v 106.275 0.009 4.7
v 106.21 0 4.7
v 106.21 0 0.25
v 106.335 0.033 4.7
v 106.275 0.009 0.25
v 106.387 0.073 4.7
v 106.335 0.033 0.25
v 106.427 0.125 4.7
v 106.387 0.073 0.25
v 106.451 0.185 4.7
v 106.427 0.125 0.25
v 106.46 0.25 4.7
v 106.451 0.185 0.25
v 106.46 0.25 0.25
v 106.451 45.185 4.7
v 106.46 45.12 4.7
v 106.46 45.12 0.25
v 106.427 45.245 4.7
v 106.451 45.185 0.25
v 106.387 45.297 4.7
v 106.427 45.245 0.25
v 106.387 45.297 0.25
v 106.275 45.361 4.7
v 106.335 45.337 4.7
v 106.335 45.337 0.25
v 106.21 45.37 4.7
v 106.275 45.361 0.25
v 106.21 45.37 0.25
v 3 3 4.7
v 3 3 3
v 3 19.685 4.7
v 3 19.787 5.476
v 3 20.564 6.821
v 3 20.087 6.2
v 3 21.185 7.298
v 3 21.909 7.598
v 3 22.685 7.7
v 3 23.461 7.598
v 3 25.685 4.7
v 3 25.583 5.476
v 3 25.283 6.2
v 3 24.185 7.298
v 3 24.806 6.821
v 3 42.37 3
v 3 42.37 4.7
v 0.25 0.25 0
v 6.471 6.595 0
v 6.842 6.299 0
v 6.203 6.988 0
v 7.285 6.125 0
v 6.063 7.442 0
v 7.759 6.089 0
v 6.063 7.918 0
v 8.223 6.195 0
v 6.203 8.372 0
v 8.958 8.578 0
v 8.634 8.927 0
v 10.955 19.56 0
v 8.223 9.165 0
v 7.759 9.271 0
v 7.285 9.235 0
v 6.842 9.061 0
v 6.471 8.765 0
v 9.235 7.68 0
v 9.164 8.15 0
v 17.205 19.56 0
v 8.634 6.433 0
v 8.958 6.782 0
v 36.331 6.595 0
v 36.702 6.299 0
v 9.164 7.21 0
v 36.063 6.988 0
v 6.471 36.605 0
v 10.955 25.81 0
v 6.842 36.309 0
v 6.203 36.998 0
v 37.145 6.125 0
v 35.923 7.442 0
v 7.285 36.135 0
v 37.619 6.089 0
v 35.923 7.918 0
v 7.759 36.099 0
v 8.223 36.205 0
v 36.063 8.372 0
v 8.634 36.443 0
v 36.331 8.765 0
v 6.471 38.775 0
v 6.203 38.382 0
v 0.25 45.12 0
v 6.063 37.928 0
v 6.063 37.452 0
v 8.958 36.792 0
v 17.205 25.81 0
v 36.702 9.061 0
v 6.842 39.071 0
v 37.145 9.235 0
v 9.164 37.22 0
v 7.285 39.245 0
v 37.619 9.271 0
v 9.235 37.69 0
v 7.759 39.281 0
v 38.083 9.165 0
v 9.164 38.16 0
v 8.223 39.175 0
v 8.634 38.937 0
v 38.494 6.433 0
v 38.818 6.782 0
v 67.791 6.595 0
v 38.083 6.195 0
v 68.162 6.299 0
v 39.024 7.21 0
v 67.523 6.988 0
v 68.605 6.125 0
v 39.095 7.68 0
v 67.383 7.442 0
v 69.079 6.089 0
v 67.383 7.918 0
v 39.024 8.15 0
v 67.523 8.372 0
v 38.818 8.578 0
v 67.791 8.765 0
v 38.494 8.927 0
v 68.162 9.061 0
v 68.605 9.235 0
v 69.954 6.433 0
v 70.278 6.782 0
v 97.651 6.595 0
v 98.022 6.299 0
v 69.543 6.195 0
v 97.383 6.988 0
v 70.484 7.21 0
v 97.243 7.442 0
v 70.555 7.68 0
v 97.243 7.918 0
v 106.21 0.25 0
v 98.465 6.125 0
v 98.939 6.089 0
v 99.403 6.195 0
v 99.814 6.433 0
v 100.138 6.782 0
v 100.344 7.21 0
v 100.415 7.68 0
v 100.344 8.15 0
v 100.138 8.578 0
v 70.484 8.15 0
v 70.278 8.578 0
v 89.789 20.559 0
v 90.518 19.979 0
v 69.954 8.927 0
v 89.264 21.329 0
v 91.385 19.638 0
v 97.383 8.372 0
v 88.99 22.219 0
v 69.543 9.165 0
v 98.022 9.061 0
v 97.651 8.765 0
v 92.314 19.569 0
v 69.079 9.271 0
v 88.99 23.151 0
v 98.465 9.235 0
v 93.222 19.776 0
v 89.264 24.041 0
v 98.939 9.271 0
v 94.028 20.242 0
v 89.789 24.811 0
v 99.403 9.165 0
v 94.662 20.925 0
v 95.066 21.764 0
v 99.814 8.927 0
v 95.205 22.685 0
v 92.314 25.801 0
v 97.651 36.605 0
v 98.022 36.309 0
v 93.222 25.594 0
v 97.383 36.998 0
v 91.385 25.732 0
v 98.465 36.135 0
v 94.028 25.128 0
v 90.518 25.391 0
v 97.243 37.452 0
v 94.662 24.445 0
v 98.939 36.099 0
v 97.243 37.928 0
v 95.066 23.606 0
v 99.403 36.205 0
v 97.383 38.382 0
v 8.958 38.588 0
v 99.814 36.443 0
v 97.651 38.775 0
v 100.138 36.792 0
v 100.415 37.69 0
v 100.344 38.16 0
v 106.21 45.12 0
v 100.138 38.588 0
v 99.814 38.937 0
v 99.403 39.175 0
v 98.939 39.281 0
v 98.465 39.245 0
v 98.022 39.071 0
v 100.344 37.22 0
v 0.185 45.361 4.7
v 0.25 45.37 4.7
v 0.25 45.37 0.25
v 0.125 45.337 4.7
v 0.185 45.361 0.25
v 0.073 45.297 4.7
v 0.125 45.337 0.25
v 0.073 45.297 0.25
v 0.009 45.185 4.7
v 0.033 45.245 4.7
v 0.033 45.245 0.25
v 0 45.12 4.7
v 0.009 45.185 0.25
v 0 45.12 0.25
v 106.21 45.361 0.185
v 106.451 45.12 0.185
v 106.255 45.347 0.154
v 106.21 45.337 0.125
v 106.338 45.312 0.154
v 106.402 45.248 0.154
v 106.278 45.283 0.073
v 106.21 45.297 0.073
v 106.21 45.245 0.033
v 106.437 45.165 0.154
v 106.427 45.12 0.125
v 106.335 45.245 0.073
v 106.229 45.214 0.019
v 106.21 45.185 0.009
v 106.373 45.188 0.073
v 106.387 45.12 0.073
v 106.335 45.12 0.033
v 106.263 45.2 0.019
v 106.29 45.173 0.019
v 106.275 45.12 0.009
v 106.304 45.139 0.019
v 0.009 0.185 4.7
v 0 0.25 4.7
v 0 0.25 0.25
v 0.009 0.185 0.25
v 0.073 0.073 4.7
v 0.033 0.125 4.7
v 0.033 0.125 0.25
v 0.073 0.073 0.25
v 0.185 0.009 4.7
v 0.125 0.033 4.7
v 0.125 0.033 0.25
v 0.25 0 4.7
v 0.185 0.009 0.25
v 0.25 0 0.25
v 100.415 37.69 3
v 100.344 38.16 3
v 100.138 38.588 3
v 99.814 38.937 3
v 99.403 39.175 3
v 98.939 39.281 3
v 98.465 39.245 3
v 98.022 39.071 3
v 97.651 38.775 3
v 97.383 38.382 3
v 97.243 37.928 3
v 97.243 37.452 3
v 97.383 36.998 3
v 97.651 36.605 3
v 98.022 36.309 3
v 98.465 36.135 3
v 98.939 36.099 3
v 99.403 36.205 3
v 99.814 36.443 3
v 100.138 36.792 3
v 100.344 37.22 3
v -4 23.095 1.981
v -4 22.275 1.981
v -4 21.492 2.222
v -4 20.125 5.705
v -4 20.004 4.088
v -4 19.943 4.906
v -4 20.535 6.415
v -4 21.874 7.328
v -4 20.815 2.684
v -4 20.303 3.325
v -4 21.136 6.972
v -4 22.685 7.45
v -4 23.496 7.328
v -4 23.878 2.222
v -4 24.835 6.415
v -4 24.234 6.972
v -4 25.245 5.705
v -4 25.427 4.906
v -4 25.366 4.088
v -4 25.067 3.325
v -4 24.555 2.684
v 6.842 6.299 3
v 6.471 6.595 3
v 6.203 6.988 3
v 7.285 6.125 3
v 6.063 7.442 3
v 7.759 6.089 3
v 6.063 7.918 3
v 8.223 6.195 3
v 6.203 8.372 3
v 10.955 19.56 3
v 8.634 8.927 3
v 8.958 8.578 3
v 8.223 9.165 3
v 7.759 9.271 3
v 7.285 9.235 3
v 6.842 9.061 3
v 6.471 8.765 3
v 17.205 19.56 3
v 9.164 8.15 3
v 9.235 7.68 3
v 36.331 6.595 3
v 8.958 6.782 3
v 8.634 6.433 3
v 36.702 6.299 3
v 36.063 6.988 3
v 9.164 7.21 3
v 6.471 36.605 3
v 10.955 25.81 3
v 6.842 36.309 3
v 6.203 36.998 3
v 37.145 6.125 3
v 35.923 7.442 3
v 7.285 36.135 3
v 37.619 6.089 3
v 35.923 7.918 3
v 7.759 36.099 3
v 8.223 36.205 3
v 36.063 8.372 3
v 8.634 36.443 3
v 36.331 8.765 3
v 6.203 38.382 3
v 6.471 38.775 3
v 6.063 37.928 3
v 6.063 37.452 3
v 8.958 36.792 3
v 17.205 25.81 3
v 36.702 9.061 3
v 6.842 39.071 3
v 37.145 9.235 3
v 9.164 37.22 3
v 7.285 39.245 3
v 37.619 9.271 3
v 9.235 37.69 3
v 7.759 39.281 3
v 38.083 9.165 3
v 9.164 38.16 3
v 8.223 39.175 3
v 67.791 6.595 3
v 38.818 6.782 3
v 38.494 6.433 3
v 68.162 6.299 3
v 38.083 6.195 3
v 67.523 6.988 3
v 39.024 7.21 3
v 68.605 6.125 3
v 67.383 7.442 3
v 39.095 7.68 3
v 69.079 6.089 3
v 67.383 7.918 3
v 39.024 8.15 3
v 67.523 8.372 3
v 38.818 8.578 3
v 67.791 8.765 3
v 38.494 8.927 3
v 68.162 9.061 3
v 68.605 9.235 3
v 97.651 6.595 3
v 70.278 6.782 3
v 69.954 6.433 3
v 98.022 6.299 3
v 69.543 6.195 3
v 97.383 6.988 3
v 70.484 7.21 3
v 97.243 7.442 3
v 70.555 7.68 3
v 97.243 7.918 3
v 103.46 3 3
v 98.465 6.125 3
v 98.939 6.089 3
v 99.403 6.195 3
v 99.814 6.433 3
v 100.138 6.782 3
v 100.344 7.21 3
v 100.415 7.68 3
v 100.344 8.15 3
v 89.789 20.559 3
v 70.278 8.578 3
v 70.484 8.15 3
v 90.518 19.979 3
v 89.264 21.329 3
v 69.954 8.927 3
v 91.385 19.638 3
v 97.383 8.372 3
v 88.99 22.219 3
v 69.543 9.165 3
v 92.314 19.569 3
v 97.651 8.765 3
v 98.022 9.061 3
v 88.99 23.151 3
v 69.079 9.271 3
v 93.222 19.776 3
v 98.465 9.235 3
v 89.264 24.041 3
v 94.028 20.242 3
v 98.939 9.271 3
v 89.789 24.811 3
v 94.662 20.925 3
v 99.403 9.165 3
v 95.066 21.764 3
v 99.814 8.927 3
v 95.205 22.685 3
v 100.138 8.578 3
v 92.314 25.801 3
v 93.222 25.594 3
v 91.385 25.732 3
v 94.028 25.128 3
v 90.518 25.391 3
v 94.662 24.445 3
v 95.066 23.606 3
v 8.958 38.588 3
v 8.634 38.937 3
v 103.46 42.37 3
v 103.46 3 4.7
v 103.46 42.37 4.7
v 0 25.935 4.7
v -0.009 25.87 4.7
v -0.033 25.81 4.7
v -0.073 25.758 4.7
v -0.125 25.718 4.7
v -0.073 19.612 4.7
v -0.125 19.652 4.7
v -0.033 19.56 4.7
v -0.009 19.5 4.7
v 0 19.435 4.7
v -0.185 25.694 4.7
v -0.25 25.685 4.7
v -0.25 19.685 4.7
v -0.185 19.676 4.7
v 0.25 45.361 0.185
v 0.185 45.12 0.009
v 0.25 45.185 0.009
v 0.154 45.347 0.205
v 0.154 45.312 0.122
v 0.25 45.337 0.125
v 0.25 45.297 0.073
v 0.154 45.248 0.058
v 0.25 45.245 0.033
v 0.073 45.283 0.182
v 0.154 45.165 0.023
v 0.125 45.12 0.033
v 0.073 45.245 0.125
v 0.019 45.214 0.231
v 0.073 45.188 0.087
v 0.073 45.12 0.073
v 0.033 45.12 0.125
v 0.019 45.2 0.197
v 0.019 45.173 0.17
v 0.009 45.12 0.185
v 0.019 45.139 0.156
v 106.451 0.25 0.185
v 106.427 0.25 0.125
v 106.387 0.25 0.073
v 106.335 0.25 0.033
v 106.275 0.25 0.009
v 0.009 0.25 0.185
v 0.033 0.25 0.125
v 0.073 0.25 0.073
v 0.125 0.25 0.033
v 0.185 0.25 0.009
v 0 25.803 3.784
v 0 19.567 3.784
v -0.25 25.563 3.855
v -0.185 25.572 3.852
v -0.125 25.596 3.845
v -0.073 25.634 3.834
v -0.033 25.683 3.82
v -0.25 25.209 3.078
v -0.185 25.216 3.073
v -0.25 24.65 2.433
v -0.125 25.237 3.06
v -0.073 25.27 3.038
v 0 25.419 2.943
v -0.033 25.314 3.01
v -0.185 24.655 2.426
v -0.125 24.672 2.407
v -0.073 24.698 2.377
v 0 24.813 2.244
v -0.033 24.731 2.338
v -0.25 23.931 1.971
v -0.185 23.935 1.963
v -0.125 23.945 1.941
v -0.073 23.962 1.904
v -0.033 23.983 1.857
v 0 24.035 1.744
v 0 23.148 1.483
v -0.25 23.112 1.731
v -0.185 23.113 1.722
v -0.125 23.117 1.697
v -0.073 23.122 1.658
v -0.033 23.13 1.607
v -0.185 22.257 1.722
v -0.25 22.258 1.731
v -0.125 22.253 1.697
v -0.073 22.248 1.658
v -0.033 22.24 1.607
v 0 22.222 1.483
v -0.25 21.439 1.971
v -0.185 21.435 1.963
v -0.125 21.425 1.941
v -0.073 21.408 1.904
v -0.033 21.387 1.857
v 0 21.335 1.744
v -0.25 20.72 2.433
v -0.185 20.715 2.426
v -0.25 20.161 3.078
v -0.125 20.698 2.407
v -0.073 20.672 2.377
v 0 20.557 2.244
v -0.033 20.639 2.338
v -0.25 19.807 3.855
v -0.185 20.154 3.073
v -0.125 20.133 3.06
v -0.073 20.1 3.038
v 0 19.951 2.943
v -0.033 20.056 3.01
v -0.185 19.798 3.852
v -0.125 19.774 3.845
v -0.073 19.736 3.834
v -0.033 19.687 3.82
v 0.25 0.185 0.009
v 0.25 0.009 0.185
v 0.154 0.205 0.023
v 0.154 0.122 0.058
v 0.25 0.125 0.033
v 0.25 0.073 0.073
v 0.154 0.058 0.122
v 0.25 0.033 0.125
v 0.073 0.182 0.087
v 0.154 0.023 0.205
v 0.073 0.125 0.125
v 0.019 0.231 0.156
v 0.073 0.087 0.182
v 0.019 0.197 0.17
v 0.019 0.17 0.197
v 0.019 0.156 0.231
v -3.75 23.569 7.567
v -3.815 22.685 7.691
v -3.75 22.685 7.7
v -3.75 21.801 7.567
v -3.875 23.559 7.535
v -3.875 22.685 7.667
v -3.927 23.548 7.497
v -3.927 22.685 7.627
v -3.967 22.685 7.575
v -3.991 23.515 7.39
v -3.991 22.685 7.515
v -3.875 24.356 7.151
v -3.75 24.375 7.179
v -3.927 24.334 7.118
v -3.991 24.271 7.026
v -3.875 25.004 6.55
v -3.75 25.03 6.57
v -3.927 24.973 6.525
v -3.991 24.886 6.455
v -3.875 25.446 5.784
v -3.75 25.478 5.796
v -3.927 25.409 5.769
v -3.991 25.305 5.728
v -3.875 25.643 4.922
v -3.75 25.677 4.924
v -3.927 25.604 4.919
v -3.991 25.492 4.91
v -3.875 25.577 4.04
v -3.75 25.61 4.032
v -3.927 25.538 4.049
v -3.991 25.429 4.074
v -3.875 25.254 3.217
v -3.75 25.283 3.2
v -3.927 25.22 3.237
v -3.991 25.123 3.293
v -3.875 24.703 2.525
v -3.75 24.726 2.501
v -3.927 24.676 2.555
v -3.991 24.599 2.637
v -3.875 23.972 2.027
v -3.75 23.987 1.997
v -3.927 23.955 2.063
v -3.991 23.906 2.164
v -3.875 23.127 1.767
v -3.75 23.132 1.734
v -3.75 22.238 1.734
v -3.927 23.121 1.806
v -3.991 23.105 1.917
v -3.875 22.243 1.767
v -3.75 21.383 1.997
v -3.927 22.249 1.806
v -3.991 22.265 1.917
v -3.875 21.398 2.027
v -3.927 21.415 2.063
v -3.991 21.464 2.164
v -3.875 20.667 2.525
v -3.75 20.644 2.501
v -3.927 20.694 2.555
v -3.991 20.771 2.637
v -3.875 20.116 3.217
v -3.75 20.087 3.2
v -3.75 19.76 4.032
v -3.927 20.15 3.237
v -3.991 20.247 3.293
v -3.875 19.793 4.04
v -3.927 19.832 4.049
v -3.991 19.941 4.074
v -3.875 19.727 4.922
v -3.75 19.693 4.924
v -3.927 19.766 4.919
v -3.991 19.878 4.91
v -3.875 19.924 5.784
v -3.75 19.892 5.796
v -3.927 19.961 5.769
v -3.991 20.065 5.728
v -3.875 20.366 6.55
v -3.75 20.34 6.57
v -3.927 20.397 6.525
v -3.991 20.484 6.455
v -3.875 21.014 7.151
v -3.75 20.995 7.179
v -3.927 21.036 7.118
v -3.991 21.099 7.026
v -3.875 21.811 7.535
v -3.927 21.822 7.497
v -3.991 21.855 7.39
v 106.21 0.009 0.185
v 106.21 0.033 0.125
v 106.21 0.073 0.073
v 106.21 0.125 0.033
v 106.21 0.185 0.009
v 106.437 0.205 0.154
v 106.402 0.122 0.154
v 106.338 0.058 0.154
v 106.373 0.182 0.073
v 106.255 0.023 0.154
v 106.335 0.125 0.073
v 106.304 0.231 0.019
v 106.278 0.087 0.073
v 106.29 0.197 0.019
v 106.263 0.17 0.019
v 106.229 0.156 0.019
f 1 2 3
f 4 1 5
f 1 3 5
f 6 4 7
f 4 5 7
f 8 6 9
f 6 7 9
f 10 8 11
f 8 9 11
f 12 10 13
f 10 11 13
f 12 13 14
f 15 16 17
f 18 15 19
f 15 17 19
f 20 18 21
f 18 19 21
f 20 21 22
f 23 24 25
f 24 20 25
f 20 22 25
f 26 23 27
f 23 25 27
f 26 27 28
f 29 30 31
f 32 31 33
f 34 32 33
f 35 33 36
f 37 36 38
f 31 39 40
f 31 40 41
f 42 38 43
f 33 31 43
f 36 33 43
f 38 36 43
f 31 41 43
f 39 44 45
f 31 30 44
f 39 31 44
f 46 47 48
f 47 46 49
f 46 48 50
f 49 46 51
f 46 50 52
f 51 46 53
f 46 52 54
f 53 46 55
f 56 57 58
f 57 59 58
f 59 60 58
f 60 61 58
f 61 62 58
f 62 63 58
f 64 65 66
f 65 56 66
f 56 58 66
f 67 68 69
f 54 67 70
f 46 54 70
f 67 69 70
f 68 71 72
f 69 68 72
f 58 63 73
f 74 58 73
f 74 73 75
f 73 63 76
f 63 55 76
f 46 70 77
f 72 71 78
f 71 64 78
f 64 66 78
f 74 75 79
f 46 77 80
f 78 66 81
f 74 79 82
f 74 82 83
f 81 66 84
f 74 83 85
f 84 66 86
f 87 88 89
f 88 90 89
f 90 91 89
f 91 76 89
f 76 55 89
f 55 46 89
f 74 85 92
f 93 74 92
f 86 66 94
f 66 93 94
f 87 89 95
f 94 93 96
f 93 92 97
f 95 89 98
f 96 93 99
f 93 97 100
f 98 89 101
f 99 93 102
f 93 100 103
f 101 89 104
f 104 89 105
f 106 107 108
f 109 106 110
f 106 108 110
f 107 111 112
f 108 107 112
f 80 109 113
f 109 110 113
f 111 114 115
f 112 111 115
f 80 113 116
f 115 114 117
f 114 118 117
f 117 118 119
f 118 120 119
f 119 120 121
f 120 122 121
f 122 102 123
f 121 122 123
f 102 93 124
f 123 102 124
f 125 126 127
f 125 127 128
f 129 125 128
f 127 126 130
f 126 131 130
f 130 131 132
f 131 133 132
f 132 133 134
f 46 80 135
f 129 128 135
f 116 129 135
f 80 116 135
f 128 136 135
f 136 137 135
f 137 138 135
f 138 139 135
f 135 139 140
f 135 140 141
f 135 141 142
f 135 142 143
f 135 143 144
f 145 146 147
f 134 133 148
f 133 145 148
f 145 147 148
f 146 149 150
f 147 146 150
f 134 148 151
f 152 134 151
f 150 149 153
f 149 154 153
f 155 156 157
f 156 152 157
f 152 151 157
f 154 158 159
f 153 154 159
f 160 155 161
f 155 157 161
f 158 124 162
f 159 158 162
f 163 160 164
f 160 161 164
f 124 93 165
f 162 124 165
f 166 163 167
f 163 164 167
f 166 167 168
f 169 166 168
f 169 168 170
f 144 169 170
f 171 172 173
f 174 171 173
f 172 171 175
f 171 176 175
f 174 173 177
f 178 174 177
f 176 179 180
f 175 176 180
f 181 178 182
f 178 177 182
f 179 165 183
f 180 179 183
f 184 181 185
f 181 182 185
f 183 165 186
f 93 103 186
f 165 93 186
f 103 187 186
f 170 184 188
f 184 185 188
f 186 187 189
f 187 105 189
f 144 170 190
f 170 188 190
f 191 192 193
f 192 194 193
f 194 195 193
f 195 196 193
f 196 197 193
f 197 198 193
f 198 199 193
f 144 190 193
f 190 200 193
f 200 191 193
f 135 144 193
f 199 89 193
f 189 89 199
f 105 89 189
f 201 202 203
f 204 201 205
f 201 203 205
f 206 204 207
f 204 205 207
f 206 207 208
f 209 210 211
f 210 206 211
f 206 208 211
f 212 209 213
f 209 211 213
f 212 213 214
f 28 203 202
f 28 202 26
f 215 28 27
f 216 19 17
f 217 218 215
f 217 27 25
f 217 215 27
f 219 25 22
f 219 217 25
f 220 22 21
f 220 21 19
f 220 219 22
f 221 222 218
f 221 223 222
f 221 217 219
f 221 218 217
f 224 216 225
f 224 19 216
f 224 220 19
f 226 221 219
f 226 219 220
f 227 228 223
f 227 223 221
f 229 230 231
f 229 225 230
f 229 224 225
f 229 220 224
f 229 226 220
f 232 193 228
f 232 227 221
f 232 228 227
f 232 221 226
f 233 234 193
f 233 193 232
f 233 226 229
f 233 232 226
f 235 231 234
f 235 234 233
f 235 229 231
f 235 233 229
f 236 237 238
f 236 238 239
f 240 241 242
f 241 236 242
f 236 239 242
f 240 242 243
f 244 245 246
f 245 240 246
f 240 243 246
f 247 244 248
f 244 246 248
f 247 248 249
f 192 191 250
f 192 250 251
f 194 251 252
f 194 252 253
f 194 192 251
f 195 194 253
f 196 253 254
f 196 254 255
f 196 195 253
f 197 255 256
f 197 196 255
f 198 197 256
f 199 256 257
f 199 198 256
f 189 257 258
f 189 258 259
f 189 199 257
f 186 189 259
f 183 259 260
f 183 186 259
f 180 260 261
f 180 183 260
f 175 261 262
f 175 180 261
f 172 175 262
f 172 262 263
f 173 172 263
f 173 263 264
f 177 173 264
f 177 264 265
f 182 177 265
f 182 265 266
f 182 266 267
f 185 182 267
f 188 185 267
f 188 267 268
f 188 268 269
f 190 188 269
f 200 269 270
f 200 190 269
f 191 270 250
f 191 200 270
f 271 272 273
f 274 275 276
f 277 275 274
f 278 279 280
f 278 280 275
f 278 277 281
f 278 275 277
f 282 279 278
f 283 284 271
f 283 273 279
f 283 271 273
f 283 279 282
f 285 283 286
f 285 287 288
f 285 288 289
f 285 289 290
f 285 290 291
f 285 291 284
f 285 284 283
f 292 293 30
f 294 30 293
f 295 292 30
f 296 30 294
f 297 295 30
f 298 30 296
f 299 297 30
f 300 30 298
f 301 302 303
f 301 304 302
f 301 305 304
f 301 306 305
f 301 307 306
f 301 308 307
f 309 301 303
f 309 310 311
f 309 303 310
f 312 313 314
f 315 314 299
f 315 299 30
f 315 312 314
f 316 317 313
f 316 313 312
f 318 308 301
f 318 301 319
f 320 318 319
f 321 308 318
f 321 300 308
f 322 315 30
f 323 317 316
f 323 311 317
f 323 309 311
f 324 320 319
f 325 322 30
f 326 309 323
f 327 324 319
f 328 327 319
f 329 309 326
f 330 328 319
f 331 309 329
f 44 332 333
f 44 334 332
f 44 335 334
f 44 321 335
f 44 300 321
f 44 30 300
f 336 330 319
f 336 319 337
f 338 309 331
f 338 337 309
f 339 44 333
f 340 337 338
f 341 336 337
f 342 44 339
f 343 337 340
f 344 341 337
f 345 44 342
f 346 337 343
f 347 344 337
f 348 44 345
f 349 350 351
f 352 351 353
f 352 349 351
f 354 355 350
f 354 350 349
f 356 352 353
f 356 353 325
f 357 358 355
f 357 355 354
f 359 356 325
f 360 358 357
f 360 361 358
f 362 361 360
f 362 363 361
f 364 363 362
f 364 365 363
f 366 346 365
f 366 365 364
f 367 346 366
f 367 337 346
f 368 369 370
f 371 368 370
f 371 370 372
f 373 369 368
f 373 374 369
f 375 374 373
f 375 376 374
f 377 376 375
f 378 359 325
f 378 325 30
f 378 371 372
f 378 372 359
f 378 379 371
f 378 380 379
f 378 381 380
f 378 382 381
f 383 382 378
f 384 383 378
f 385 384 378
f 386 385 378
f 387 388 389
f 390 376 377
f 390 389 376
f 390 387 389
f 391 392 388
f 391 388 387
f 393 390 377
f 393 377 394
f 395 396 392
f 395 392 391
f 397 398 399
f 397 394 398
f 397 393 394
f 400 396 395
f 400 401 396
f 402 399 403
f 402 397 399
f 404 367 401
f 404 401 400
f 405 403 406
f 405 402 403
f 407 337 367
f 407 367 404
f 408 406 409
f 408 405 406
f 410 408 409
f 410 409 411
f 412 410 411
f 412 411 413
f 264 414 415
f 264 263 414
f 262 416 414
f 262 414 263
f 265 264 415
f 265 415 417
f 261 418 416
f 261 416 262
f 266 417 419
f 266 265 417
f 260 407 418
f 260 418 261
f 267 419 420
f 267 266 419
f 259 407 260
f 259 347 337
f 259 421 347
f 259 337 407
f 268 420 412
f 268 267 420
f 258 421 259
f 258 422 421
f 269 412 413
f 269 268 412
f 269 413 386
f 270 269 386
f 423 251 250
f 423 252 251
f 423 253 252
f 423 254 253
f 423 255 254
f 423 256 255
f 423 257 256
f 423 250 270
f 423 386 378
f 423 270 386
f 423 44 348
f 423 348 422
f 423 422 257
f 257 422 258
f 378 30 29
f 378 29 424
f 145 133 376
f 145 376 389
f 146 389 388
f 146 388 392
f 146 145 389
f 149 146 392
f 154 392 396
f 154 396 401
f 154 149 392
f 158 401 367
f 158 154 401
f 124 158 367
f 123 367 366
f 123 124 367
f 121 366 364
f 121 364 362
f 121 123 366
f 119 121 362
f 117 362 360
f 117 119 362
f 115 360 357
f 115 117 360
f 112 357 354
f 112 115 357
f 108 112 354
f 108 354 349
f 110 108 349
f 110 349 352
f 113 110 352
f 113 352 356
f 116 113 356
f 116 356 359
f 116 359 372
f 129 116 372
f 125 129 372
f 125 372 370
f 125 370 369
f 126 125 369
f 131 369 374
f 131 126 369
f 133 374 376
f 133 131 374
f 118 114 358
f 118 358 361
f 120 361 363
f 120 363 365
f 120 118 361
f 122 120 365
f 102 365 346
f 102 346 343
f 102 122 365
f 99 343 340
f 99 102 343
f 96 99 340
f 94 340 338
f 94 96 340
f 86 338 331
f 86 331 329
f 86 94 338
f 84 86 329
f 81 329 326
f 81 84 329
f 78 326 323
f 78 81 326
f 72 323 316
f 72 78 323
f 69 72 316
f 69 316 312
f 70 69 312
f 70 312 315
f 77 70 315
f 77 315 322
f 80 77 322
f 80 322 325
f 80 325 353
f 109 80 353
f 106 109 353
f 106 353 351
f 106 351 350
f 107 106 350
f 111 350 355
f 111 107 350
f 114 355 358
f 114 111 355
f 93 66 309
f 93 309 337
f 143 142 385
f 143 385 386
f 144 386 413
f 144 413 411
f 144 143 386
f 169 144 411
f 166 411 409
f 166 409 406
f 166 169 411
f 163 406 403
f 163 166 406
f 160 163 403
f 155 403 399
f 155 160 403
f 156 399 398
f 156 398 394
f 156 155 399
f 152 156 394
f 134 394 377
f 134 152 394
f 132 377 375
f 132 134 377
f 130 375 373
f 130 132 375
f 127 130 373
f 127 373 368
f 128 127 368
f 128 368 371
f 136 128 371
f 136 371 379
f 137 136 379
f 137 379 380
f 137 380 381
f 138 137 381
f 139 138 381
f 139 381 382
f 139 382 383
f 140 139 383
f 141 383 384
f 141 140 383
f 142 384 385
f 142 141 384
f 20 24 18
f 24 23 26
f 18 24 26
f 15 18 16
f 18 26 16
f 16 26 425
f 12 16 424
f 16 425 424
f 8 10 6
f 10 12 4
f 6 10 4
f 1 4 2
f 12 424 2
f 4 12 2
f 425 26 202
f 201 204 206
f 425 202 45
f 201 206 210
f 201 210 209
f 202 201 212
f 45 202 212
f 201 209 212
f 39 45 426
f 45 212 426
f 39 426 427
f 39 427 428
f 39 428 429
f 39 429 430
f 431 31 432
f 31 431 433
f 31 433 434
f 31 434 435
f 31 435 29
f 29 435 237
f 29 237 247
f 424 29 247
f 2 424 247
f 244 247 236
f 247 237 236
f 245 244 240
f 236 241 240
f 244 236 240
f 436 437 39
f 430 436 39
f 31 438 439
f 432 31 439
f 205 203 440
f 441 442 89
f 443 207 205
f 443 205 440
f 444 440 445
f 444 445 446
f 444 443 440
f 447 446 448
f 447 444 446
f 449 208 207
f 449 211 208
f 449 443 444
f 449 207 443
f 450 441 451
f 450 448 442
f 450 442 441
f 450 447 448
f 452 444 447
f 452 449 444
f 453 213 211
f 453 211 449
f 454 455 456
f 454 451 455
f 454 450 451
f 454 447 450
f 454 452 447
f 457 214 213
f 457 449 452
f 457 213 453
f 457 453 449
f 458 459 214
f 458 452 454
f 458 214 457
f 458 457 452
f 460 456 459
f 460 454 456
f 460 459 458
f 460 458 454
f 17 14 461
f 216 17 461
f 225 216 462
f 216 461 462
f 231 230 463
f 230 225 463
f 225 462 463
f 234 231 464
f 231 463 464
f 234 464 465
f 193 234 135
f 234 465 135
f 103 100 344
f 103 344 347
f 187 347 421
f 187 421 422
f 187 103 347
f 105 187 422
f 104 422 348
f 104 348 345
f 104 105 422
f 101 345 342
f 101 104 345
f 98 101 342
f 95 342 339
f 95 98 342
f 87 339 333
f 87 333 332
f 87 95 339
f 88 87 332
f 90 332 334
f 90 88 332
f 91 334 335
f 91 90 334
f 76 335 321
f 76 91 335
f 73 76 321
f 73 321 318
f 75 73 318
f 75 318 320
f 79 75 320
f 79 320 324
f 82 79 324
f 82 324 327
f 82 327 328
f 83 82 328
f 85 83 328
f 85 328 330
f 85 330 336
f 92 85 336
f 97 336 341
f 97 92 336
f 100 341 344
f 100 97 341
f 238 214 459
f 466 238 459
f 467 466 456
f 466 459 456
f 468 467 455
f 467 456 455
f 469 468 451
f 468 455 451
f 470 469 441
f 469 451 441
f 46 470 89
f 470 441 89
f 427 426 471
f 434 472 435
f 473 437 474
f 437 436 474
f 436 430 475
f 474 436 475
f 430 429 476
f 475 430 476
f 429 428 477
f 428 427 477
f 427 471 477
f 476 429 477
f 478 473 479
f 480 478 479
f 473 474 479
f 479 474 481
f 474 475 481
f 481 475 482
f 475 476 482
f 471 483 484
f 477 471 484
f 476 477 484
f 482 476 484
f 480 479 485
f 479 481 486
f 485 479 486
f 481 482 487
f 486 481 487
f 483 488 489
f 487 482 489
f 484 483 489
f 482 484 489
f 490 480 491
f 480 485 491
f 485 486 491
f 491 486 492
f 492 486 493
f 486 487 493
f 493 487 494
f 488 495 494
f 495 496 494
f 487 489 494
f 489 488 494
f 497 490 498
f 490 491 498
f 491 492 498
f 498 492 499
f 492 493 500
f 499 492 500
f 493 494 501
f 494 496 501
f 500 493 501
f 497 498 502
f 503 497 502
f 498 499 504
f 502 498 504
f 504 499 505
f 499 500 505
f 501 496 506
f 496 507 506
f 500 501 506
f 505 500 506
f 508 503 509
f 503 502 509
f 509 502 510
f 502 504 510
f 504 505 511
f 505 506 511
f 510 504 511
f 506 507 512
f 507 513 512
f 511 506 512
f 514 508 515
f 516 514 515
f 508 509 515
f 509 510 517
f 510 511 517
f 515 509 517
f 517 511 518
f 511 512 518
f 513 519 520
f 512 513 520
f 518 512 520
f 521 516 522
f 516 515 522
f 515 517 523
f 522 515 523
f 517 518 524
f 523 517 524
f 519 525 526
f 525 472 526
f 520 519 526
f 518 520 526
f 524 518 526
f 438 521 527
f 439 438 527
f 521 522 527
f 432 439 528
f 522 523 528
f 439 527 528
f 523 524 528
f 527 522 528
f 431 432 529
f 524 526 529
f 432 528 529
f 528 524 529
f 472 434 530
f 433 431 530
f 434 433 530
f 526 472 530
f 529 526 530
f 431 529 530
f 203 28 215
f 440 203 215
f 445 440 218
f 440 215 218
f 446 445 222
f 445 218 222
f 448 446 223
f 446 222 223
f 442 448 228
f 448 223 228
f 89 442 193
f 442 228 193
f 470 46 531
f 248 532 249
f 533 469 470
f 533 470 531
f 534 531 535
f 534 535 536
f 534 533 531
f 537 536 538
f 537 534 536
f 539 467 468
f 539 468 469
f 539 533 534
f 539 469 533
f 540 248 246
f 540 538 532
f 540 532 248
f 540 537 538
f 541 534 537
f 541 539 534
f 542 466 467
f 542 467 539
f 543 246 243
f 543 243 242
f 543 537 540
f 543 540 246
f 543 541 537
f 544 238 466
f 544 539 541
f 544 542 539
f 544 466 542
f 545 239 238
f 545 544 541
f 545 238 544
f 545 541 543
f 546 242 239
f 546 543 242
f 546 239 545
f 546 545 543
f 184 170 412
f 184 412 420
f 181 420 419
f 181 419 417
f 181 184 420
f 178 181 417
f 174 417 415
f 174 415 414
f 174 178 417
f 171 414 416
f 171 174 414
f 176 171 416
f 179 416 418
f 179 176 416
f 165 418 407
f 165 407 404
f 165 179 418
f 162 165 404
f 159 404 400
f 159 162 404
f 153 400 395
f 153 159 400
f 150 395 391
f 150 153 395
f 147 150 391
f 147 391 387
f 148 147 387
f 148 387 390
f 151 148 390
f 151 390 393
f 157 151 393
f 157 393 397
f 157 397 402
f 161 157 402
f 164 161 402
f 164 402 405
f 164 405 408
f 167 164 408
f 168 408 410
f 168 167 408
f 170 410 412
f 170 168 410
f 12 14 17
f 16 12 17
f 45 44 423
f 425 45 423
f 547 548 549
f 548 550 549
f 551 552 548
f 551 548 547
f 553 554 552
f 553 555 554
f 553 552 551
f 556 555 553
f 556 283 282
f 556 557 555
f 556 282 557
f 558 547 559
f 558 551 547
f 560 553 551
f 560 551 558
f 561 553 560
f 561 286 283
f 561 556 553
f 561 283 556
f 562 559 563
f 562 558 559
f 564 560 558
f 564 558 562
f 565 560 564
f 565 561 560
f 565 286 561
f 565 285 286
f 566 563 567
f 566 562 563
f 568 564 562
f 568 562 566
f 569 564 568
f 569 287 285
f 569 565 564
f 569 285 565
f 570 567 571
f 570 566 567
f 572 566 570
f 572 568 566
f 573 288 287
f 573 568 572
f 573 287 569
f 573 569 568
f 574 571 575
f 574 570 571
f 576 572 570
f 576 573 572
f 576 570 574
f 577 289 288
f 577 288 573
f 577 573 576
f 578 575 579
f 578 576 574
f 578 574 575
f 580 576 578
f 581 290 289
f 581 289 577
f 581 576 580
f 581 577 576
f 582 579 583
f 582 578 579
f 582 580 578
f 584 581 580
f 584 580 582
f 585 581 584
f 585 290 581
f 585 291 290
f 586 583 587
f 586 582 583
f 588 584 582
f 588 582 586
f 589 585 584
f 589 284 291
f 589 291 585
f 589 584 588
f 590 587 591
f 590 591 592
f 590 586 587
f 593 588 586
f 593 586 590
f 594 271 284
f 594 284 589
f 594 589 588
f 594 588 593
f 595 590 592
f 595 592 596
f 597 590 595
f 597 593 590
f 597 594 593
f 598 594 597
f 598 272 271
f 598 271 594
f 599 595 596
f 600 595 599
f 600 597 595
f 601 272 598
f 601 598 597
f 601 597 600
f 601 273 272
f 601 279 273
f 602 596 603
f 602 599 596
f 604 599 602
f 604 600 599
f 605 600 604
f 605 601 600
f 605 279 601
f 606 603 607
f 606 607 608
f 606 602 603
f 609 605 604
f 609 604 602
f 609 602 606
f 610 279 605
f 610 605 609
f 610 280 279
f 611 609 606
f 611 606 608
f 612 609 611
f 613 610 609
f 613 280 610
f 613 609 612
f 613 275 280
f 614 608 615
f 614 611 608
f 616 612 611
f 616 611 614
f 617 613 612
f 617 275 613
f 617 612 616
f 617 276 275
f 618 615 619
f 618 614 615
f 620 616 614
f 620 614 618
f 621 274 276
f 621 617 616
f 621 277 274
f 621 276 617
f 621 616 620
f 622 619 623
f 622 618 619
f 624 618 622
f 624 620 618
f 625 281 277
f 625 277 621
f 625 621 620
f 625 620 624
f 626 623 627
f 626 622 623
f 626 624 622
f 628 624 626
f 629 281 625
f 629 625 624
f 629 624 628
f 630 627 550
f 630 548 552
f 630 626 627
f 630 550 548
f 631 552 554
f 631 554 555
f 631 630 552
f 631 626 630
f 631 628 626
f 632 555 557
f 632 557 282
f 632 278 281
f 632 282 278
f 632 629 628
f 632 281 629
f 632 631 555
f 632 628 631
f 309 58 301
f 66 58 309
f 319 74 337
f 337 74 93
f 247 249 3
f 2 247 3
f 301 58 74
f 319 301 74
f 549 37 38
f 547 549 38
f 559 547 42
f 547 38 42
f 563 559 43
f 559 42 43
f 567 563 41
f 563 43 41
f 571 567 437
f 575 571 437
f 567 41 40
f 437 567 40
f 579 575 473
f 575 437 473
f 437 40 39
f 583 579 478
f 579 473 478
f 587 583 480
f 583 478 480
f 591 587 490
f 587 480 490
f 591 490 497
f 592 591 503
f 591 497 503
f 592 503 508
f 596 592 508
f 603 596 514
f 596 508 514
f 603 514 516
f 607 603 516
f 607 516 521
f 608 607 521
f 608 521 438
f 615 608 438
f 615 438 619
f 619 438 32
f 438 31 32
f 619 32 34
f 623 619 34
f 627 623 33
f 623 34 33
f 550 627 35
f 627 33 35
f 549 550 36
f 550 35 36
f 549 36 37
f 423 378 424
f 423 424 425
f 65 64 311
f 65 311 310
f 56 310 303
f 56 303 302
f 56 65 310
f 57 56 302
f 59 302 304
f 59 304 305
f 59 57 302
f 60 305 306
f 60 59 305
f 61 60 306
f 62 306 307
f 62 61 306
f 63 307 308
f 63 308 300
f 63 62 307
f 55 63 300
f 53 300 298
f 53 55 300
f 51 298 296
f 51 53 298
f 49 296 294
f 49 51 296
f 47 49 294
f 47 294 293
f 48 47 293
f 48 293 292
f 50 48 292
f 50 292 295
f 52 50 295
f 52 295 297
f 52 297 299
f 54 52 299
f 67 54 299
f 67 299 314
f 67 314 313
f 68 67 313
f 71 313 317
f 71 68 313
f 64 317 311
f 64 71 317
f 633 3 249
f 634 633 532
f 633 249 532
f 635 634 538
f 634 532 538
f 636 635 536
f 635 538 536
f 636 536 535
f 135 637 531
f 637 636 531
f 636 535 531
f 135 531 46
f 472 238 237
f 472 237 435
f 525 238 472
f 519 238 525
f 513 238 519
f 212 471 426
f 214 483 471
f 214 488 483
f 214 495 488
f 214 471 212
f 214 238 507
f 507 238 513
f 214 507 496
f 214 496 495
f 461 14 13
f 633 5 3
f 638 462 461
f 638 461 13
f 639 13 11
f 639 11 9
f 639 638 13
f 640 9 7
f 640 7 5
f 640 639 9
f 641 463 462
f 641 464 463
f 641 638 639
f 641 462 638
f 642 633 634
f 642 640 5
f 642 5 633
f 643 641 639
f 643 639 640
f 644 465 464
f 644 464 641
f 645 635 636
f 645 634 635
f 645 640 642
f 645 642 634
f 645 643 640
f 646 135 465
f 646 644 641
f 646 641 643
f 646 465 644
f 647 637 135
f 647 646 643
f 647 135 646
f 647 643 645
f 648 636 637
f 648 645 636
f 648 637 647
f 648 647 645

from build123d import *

# Parameters (mm, degrees)
SKETCH1_W                = 100.46
SKETCH1_H                = 39.37
SKETCH1_R                = 1.595
SKETCH1_R_2              = 3.125
SKETCH1_W_2              = 6.25
SKETCH1_H_2              = 6.25
BOSS_EXTRUDE1_DEPTH      = 3
SKETCH1_5_W              = 106.46
SKETCH1_5_H              = 45.37
SKETCH1_5_W_2            = 100.46
SKETCH1_5_H_2            = 39.37
BOSS_EXTRUDE2_DEPTH      = 4.7
BOSS_EXTRUDE3_DEPTH      = 4
BOSS_EXTRUDE3_DEPTH_BACK = 3
SKETCH2_R                = 3
FILLET1_R                = 0.25


with BuildPart() as part:
    # Sketch1 → Boss-Extrude1 (new body)
    with BuildSketch(Plane.XY):
        with Locations((53.23, 22.685)):
            Rectangle(SKETCH1_W, SKETCH1_H)
        with Locations((7.64, 7.68)):
            Circle(SKETCH1_R, mode=Mode.SUBTRACT)
        with Locations((37.5, 7.68)):
            Circle(SKETCH1_R, mode=Mode.SUBTRACT)
        with Locations((68.96, 7.68)):
            Circle(SKETCH1_R, mode=Mode.SUBTRACT)
        with Locations((98.82, 7.68)):
            Circle(SKETCH1_R, mode=Mode.SUBTRACT)
        with Locations((7.64, 37.69)):
            Circle(SKETCH1_R, mode=Mode.SUBTRACT)
        with Locations((98.82, 37.69)):
            Circle(SKETCH1_R, mode=Mode.SUBTRACT)
        with Locations((92.08, 22.685)):
            Circle(SKETCH1_R_2, mode=Mode.SUBTRACT)
        with Locations((14.08, 22.685)):
            Rectangle(SKETCH1_W_2, SKETCH1_H_2, mode=Mode.SUBTRACT)
    extrude(amount=BOSS_EXTRUDE1_DEPTH)

    # Sketch1<5> → Boss-Extrude2 (add)
    with BuildSketch(Plane.XY):
        with Locations((53.23, 22.685)):
            Rectangle(SKETCH1_5_W, SKETCH1_5_H)
        with Locations((53.23, 22.685)):
            Rectangle(SKETCH1_5_W_2, SKETCH1_5_H_2, mode=Mode.SUBTRACT)
    extrude(amount=BOSS_EXTRUDE2_DEPTH)

    # Sketch2 → Boss-Extrude3 (add, two sides: drawn at the far end of the back side and taken through both)
    with BuildSketch(Plane.ZY.offset(-BOSS_EXTRUDE3_DEPTH_BACK)):
        with Locations((4.7, 22.685)):
            Circle(SKETCH2_R)
    extrude(amount=BOSS_EXTRUDE3_DEPTH + BOSS_EXTRUDE3_DEPTH_BACK)

    # Fillet1
    # the kernel refuses this fillet: 0.25 mm, written as the material it adds along each edge
    with BuildSketch(Plane(origin=(0, 22.685, 4.7), x_dir=(0, 1, 0), z_dir=(0, 0, 1))) as fillet1_piece_1:
        with BuildLine():
            CenterArc((3 + FILLET1_R, FILLET1_R), FILLET1_R, 180, 90)
            Line((3 + FILLET1_R, 0), (3, 0))
            Line((3, 0), (3, FILLET1_R))
        make_face()
    revolve(axis=Axis((0, 22.685, 4.7), (-1, 0, 0)), revolution_arc=180)
    # the kernel refuses this fillet: 0.25 mm, written as the material it takes off along each edge
    with BuildSketch(Plane(origin=(0.25, 0.25, 0.25), x_dir=(0, 0, -1), z_dir=(-1, 0, 0))) as fillet1_2_piece_1_section:
        Polygon((0, 0), (FILLET1_R, 0), (FILLET1_R, FILLET1_R), (0, FILLET1_R), align=None)
    fillet1_2_piece_1 = extrude(amount=FILLET1_R, mode=Mode.PRIVATE)
    fillet1_2_piece_1 = fillet1_2_piece_1 - Plane(origin=(0.25, 0.25, 0.25), x_dir=(0, 0.7071067811865475, 0.7071067811865475), z_dir=(-1, 0, 0)) * Sphere(FILLET1_R, mode=Mode.PRIVATE)
    add(fillet1_2_piece_1, mode=Mode.SUBTRACT)
    with BuildSketch(Plane(origin=(106.21, 0.25, 0.25), x_dir=(0, -1, 0), z_dir=(0, 0, -1))) as fillet1_2_piece_2_section:
        Polygon((0, 0), (FILLET1_R, 0), (FILLET1_R, -FILLET1_R), (0, -FILLET1_R), align=None)
    fillet1_2_piece_2 = extrude(amount=FILLET1_R, mode=Mode.PRIVATE)
    fillet1_2_piece_2 = fillet1_2_piece_2 - Plane(origin=(106.21, 0.25, 0.25), x_dir=(-0.7071067811865475, 0.7071067811865475, 0), z_dir=(0, 0, -1)) * Sphere(FILLET1_R, mode=Mode.PRIVATE)
    add(fillet1_2_piece_2, mode=Mode.SUBTRACT)
    with BuildSketch(Plane(origin=(106.21, 45.12, 0.25), x_dir=(1, 0, 0), z_dir=(0, 0, -1))) as fillet1_2_piece_3_section:
        Polygon((0, 0), (FILLET1_R, 0), (FILLET1_R, -FILLET1_R), (0, -FILLET1_R), align=None)
    fillet1_2_piece_3 = extrude(amount=FILLET1_R, mode=Mode.PRIVATE)
    fillet1_2_piece_3 = fillet1_2_piece_3 - Plane(origin=(106.21, 45.12, 0.25), x_dir=(-0.7071067811865475, -0.7071067811865475, 0), z_dir=(0, 0, -1)) * Sphere(FILLET1_R, mode=Mode.PRIVATE)
    add(fillet1_2_piece_3, mode=Mode.SUBTRACT)
    with BuildSketch(Plane(origin=(0.25, 45.12, 0.25), x_dir=(0, 0, -1), z_dir=(-1, 0, 0))) as fillet1_2_piece_4_section:
        Polygon((0, 0), (FILLET1_R, 0), (FILLET1_R, -FILLET1_R), (0, -FILLET1_R), align=None)
    fillet1_2_piece_4 = extrude(amount=FILLET1_R, mode=Mode.PRIVATE)
    fillet1_2_piece_4 = fillet1_2_piece_4 - Plane(origin=(0.25, 45.12, 0.25), x_dir=(0, -0.7071067811865475, 0.7071067811865475), z_dir=(-1, 0, 0)) * Sphere(FILLET1_R, mode=Mode.PRIVATE)
    add(fillet1_2_piece_4, mode=Mode.SUBTRACT)
    with BuildSketch(Plane(origin=(0.25, 0, 0), x_dir=(0, 1, 0), z_dir=(1, 0, 0)), Plane(origin=(106.21, 45.37, 0), x_dir=(0, -1, 0), z_dir=(-1, 0, 0))) as fillet1_2_piece_5:
        with BuildLine():
            CenterArc((FILLET1_R, FILLET1_R), FILLET1_R, 180, 90)
            Line((0, FILLET1_R), (0, 0))
            Line((0, 0), (FILLET1_R, 0))
        make_face()
    extrude(amount=105.96, mode=Mode.SUBTRACT)
    with BuildSketch(Plane(origin=(0, 0, 0.25), x_dir=(1, 0, 0), z_dir=(0, 0, 1))) as fillet1_2_piece_6:
        with BuildLine():
            CenterArc((FILLET1_R, FILLET1_R), FILLET1_R, 180, 90)
            Line((0, FILLET1_R), (0, 0))
            Line((0, 0), (FILLET1_R, 0))
        make_face()
    extrude(amount=5.075, mode=Mode.SUBTRACT)
    with BuildSketch(Plane(origin=(106.46, 0.25, 0), x_dir=(-1, 0, 0), z_dir=(0, 1, 0)), Plane(origin=(0, 45.12, 0), x_dir=(1, 0, 0), z_dir=(0, -1, 0))) as fillet1_2_piece_7:
        with BuildLine():
            CenterArc((FILLET1_R, FILLET1_R), FILLET1_R, 180, 90)
            Line((0, FILLET1_R), (0, 0))
            Line((0, 0), (FILLET1_R, 0))
        make_face()
    extrude(amount=44.87, mode=Mode.SUBTRACT)
    with BuildSketch(Plane(origin=(106.46, 0, 0.25), x_dir=(-1, 0, 0), z_dir=(0, 0, 1)), Plane(origin=(106.46, 45.37, 0.25), x_dir=(0, -1, 0), z_dir=(0, 0, 1)), Plane(origin=(0, 45.37, 0.25), x_dir=(1, 0, 0), z_dir=(0, 0, 1))) as fillet1_2_piece_8:
        with BuildLine():
            CenterArc((FILLET1_R, -FILLET1_R), FILLET1_R, 90, 90)
            Line((0, -FILLET1_R), (0, 0))
            Line((0, 0), (FILLET1_R, 0))
        make_face()
    extrude(amount=5.075, mode=Mode.SUBTRACT)
    with BuildSketch(Plane(origin=(-4, 22.685, 4.7), x_dir=(0, 0, 1), z_dir=(0, -1, 0))) as fillet1_2_piece_9:
        with BuildLine():
            CenterArc((3 - FILLET1_R, -FILLET1_R), FILLET1_R, 0, 90)
            Line((3 - FILLET1_R, 0), (3, 0))
            Line((3, 0), (3, -FILLET1_R))
        make_face()
    revolve(axis=Axis((-4, 22.685, 4.7), (-1, 0, 0)), mode=Mode.SUBTRACT)


solid = part.part
